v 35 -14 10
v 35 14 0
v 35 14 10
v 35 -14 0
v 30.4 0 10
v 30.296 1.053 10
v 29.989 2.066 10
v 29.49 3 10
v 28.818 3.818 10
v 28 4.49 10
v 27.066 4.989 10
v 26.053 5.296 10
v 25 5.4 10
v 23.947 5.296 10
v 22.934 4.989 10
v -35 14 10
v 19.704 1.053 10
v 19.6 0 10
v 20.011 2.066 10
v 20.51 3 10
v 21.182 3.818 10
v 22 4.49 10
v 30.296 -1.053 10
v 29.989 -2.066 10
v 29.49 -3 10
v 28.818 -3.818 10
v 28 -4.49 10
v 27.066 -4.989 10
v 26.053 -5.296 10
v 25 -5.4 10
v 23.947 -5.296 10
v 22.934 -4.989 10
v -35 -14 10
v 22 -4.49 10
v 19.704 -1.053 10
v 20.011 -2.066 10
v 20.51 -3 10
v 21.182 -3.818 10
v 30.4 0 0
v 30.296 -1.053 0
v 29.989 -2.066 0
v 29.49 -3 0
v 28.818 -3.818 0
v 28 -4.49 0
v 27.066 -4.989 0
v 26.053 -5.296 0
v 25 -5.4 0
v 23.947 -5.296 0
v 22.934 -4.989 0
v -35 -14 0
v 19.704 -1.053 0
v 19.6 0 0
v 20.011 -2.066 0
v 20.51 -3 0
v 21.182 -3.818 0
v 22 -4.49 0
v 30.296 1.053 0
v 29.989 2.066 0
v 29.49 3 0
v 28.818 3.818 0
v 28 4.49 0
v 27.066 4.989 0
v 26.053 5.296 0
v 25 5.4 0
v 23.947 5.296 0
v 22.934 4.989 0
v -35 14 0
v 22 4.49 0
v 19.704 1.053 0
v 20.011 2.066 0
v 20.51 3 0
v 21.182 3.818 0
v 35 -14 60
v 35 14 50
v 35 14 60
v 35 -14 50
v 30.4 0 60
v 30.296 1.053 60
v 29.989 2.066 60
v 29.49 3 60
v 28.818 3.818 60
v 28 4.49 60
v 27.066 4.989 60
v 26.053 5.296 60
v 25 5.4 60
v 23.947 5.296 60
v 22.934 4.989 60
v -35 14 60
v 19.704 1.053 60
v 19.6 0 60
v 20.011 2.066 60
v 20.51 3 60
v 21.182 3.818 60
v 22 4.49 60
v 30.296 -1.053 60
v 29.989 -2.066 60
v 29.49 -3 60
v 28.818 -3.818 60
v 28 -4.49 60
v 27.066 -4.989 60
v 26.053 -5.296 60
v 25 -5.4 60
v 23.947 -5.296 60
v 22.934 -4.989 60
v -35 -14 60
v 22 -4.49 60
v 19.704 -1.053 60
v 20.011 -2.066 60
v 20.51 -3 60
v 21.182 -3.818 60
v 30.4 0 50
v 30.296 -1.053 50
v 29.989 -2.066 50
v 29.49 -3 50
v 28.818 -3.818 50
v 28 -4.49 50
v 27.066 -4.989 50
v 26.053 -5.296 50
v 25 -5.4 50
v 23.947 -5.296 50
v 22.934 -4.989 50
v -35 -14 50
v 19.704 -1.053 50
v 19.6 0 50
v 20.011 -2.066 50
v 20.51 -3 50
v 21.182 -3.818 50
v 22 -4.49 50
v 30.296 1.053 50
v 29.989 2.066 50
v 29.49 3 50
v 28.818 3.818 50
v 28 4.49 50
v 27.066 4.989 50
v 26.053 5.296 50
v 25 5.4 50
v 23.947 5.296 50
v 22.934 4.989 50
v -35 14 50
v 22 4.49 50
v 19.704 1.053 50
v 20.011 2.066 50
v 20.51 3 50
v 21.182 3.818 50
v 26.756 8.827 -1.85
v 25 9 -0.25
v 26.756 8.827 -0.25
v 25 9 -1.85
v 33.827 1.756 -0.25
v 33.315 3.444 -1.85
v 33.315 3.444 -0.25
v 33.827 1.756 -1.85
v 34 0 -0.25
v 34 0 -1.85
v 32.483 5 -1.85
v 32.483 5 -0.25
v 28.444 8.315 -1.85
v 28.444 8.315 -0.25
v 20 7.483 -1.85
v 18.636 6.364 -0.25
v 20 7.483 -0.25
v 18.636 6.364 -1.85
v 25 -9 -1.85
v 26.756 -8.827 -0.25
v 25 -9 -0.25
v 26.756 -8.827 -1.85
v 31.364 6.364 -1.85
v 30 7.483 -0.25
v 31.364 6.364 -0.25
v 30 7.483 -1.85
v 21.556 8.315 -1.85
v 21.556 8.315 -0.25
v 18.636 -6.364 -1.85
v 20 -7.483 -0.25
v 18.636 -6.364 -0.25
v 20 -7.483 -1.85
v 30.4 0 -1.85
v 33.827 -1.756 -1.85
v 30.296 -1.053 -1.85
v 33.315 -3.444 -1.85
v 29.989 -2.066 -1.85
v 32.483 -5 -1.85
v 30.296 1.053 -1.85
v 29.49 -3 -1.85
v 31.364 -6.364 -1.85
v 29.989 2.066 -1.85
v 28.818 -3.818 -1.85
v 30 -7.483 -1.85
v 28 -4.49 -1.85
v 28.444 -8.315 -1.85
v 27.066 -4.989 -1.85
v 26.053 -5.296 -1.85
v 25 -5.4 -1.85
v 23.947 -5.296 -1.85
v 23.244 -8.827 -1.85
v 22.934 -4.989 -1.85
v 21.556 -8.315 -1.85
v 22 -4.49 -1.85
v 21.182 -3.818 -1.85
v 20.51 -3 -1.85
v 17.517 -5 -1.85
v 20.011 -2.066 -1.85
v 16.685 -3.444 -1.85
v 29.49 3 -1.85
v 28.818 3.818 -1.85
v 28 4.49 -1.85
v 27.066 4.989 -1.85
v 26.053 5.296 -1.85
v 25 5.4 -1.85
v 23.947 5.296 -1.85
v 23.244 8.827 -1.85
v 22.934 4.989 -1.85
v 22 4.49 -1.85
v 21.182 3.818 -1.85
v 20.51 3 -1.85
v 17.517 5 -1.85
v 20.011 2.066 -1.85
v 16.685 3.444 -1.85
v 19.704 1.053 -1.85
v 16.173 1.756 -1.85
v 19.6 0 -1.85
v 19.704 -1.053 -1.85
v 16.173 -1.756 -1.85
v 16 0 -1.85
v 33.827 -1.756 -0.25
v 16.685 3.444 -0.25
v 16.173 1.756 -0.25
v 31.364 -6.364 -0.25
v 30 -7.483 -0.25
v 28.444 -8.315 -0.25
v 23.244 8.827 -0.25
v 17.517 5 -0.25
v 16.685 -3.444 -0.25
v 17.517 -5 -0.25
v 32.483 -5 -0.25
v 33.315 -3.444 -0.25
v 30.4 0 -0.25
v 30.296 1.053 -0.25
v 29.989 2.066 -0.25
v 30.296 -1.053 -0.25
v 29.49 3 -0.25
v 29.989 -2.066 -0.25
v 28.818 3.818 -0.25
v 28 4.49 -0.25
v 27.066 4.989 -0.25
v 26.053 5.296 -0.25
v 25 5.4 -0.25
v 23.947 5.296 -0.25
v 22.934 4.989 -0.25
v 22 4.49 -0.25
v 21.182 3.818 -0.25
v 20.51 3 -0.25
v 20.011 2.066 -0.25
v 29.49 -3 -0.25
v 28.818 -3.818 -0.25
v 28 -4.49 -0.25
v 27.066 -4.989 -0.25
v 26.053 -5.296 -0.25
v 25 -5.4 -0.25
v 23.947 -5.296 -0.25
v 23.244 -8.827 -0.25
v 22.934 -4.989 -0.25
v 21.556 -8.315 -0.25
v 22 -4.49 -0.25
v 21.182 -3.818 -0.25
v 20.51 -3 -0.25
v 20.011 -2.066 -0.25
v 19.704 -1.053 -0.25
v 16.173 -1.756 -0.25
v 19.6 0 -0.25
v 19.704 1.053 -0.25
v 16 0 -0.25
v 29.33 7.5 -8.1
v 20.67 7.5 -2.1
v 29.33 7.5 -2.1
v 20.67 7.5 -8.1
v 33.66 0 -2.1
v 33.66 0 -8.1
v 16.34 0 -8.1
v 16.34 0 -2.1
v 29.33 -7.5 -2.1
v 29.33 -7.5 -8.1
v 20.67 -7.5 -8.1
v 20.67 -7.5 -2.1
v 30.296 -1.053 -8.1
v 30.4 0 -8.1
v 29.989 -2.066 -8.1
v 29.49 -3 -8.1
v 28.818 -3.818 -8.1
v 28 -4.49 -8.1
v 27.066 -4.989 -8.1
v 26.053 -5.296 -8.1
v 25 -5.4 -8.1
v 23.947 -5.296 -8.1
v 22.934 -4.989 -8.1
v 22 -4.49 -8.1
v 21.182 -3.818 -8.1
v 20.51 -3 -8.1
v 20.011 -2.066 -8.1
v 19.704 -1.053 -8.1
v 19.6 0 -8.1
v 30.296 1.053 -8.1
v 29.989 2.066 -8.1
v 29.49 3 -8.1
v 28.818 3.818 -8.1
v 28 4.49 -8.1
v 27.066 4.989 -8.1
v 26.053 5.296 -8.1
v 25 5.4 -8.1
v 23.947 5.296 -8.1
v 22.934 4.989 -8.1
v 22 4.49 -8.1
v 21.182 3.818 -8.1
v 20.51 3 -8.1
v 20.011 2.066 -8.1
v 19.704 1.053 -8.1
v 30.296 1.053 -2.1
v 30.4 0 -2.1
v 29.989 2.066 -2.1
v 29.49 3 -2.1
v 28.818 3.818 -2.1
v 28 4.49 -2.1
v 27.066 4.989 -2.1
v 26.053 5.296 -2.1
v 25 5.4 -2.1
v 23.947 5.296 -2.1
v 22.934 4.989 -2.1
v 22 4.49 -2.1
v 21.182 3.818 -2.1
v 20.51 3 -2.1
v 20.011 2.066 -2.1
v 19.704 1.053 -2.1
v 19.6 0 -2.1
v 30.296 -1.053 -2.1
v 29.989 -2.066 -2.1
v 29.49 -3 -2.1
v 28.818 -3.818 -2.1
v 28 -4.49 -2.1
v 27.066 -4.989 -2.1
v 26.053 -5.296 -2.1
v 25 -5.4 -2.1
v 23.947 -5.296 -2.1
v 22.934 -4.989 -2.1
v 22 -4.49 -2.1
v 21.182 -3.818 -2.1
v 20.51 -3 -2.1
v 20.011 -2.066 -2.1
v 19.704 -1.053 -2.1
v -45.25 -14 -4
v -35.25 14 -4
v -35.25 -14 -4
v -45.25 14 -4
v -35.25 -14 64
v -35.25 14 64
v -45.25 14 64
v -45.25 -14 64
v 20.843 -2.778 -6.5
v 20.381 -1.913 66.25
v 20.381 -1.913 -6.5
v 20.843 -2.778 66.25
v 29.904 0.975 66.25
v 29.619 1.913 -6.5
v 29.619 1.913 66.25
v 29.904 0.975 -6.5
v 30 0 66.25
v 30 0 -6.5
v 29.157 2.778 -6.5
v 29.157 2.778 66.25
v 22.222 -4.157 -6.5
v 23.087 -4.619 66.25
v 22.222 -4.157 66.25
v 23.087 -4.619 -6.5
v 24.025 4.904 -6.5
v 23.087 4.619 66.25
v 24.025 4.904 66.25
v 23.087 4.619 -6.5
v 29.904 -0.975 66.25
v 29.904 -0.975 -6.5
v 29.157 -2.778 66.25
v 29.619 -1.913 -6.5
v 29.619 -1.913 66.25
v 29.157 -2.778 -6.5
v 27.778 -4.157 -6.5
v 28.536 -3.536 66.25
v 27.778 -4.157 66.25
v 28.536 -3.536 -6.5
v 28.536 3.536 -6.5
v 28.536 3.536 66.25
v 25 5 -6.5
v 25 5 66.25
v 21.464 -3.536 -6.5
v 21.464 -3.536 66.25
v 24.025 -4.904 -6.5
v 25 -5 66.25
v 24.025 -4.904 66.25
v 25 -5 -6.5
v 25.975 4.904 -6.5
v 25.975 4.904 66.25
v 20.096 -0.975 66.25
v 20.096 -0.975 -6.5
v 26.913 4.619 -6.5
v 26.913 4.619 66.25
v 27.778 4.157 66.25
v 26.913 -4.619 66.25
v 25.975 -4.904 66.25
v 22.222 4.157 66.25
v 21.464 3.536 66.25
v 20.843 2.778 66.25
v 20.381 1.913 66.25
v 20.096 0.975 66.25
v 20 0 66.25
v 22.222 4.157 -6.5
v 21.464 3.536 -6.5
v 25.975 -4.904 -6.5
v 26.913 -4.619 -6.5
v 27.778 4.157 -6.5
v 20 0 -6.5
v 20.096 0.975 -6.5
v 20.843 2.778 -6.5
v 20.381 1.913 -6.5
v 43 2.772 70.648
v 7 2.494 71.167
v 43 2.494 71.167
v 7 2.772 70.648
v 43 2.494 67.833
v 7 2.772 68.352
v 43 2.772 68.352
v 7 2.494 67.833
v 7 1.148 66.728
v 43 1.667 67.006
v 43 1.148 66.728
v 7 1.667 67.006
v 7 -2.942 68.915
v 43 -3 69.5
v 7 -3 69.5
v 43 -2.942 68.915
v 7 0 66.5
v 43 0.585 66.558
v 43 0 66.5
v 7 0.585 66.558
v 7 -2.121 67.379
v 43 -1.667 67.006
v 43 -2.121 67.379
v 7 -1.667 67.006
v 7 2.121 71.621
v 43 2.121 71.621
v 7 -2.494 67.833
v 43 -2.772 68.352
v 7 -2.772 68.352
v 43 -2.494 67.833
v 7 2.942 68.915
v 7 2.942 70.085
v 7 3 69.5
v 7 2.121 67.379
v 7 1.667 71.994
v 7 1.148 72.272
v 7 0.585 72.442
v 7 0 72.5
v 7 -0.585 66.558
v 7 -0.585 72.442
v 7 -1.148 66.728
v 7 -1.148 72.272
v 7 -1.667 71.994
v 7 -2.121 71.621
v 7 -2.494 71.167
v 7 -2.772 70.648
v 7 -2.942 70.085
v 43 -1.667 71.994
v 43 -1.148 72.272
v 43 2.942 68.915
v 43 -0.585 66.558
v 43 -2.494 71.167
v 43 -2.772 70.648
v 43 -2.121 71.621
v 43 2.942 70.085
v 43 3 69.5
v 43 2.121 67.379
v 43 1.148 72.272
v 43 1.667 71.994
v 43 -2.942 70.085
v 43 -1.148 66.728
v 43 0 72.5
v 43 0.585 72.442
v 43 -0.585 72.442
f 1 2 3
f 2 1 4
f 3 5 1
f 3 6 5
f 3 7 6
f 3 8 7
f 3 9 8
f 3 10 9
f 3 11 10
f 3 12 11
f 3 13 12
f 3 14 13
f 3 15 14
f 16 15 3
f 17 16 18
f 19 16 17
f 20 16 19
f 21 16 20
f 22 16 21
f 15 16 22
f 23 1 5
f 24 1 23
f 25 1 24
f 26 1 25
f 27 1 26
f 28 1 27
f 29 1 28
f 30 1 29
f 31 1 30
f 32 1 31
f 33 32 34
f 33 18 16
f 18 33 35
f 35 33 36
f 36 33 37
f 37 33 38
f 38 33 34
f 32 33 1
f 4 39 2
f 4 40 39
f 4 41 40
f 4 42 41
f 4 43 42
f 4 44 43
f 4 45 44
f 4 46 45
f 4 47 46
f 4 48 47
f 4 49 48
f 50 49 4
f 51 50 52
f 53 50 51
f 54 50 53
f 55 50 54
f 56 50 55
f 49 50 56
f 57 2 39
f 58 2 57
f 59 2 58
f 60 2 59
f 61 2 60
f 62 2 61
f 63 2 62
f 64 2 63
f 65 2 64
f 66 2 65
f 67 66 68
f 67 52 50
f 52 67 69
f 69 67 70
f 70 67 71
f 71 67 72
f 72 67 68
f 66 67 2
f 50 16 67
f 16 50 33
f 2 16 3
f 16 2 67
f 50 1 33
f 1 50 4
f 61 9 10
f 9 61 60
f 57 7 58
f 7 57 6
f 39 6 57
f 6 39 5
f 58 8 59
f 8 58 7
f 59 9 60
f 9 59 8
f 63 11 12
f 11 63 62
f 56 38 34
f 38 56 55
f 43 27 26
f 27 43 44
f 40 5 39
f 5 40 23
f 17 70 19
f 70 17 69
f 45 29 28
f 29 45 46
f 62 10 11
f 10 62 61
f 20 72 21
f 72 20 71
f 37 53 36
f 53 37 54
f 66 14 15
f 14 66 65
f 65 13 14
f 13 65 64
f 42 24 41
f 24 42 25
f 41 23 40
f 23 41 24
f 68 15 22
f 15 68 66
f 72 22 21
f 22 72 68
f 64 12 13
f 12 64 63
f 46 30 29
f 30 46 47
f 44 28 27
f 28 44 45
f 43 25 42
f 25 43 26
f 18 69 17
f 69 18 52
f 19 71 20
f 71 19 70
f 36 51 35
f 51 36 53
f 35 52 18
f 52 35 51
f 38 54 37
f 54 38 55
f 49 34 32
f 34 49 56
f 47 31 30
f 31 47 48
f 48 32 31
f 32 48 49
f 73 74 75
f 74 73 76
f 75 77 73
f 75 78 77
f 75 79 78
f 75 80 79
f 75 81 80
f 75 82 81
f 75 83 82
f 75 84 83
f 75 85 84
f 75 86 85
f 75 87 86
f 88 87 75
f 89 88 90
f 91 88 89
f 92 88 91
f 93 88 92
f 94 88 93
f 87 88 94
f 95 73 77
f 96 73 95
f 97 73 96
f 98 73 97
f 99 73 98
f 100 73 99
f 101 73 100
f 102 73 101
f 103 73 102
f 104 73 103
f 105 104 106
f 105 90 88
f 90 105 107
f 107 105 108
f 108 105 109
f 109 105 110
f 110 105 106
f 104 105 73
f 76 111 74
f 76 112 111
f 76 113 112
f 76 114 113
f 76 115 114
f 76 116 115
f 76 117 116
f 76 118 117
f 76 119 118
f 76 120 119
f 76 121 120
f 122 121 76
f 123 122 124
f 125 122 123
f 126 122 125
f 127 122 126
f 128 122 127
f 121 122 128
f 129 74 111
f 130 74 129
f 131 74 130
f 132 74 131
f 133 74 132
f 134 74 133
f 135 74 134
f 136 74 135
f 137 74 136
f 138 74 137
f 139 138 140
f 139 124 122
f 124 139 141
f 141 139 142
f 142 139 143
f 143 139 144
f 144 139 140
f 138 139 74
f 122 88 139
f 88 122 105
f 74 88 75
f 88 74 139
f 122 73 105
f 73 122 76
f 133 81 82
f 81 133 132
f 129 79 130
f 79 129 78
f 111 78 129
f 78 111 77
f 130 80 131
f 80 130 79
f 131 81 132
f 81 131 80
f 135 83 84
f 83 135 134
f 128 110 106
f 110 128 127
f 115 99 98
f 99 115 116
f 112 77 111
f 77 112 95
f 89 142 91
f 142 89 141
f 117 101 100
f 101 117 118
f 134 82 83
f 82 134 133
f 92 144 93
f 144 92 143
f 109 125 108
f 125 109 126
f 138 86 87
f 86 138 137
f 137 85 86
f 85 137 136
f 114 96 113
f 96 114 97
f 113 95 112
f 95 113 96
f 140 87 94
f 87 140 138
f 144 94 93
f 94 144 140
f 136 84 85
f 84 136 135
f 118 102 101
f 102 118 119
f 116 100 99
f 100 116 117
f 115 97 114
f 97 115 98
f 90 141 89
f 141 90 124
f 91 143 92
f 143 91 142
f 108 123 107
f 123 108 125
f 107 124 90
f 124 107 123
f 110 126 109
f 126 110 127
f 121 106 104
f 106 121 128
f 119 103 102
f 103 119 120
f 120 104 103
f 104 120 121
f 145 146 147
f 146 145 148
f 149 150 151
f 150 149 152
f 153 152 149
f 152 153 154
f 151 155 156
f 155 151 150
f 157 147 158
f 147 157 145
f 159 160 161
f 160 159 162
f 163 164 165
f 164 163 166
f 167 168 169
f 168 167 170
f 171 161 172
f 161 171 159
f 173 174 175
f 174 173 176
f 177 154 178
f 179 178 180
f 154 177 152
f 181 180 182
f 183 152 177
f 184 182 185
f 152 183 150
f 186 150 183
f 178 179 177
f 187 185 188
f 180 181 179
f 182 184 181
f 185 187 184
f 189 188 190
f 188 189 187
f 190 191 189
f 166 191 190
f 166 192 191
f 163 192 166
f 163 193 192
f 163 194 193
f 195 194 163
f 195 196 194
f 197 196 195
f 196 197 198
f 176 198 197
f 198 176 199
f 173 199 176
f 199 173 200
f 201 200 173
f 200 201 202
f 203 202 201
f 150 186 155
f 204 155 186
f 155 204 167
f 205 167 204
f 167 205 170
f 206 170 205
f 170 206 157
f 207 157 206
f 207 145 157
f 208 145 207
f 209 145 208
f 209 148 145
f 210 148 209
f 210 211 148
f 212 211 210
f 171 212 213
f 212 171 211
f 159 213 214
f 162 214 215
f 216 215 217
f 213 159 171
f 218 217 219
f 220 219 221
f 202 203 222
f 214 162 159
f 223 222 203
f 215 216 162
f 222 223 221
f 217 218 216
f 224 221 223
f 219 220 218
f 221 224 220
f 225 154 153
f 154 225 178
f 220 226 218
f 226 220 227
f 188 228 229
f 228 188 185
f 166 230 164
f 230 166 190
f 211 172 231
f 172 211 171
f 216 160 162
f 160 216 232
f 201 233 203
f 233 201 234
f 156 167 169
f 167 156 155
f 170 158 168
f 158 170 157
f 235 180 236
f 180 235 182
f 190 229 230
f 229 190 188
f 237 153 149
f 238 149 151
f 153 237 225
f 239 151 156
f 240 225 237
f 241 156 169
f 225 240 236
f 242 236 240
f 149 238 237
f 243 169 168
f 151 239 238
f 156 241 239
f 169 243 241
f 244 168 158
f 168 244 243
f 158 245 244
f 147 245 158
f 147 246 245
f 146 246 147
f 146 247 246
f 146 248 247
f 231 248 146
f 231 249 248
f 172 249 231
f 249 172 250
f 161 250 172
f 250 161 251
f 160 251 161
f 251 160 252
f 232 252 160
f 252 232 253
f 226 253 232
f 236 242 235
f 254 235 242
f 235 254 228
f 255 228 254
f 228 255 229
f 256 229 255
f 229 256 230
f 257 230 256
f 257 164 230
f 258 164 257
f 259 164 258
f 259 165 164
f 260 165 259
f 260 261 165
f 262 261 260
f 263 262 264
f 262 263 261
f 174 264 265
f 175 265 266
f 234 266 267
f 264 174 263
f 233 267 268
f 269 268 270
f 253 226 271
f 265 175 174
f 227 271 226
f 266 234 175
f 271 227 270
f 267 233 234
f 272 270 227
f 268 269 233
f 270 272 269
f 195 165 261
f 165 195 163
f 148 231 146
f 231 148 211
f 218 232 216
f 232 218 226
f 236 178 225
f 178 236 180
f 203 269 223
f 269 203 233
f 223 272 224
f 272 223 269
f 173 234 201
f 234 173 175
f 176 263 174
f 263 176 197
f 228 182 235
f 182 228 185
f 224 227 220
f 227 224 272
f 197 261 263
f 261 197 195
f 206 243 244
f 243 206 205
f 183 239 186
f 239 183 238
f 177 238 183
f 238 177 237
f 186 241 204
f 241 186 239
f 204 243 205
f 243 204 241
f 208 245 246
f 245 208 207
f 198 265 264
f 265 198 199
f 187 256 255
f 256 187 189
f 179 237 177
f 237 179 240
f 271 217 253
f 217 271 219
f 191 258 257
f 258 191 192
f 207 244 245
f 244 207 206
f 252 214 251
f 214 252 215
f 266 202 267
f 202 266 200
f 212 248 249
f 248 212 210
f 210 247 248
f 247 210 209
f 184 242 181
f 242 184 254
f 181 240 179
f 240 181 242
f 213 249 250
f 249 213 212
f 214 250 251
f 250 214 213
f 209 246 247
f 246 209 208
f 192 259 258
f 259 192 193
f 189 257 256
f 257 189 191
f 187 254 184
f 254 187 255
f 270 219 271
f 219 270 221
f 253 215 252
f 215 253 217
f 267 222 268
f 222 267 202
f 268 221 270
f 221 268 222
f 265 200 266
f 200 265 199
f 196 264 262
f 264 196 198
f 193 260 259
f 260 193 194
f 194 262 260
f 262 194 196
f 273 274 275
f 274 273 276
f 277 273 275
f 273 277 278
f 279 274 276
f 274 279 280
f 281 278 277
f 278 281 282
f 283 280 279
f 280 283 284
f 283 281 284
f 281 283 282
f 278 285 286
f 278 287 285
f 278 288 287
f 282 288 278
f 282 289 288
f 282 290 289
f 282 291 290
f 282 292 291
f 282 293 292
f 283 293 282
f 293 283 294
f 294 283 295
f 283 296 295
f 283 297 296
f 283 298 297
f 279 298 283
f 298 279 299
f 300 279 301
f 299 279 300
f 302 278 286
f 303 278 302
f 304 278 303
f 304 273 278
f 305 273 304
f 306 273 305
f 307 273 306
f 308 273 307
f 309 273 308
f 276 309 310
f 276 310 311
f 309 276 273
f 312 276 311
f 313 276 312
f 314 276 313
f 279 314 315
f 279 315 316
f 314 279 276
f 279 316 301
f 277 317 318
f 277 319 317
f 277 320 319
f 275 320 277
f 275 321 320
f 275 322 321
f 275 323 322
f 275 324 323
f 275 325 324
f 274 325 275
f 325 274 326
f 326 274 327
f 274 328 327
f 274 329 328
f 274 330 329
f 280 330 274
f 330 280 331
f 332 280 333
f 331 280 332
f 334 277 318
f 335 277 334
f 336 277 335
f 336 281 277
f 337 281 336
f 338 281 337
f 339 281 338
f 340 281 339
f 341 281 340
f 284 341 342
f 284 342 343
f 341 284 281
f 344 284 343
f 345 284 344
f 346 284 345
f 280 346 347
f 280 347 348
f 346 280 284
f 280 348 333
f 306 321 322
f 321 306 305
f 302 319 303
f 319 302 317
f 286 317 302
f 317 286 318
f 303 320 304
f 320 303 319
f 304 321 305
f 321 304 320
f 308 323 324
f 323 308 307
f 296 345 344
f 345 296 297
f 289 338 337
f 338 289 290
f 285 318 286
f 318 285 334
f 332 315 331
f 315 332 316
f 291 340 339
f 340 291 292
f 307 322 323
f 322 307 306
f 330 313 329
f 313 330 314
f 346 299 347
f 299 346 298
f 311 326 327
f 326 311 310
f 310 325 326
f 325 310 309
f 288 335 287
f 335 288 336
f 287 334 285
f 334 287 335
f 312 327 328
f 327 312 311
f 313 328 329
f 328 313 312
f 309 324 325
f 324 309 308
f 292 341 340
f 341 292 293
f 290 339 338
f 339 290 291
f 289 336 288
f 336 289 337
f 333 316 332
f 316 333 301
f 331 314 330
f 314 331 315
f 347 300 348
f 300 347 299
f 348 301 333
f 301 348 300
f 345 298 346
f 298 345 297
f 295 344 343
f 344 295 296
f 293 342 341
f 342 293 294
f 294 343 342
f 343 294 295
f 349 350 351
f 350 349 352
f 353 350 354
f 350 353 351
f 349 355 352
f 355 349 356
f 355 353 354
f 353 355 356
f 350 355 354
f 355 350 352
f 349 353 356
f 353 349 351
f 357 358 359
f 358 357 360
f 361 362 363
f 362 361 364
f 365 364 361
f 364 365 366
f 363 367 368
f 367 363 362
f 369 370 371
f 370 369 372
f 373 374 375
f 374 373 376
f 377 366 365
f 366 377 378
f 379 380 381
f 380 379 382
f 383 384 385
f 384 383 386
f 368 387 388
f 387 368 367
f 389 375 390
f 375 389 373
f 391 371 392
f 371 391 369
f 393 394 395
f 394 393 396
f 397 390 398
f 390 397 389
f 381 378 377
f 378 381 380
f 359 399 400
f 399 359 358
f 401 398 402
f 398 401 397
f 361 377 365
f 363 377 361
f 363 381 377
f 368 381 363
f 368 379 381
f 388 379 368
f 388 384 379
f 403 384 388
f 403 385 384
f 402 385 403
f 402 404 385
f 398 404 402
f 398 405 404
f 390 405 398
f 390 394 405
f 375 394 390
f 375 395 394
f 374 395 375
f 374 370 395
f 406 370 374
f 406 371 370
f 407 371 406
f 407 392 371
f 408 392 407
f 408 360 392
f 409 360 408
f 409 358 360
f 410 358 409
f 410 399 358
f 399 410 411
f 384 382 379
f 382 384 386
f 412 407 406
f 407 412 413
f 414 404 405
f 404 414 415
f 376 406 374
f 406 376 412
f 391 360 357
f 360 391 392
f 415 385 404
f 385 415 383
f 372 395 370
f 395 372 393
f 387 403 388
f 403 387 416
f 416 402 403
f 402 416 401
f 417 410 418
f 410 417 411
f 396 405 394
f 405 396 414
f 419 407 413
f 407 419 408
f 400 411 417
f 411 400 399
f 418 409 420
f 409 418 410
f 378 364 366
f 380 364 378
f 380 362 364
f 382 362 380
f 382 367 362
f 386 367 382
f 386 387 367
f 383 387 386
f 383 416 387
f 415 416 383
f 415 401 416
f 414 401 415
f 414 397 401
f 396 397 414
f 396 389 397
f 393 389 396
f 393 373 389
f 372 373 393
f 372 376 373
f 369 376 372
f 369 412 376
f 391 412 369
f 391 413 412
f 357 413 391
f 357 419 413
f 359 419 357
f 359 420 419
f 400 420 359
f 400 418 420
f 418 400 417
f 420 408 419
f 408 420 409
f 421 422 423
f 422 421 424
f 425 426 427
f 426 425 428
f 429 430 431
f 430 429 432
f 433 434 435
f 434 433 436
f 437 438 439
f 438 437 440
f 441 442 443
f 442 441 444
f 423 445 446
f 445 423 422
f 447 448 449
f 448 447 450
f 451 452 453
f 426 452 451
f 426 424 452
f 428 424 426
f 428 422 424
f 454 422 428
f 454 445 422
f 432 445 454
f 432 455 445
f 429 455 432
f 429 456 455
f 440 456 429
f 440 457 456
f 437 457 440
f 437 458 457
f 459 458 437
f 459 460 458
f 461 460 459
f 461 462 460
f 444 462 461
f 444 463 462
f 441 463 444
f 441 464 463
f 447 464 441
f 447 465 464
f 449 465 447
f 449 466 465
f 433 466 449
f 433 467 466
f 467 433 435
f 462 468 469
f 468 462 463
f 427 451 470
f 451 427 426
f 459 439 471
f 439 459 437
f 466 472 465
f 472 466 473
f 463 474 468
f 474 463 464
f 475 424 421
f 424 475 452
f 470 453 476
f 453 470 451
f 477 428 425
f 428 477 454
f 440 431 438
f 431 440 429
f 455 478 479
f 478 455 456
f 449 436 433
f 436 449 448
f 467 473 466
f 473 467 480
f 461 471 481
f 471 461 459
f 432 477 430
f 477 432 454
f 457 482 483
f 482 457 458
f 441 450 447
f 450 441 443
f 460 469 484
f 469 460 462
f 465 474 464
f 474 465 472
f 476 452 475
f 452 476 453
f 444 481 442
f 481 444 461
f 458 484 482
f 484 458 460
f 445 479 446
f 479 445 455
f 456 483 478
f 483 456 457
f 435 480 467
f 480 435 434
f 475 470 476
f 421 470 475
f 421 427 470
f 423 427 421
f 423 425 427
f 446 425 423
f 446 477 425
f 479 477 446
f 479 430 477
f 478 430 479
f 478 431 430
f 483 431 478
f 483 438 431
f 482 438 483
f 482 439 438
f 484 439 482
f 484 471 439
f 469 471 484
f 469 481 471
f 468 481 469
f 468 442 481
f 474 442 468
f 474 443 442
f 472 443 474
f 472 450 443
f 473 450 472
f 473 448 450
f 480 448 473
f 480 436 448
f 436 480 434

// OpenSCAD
$fn = 32;

// ------------------------------------------------------------------------
// C clamp: throat 50 mm, screw d10
// Every part is its own module, assembly() places every instance.
// ------------------------------------------------------------------------

// --- part 1 ---
module clamp_arm() {
  difference() {
    translate([-35, -14, 0]) cube([70, 28, 10]);
    translate([25, 0, -1]) cylinder(h = 12, d = 10.8);
  }
}

// --- part 2 ---
module clamp_spine() {
  difference() {
    translate([-34, -14, 0]) cube([68, 28, 10]);
  }
}

// --- part 3 ---
module clamp_screw() {
  translate([0, 0, -36.375]) cylinder(h = 72.75, d = 10);
}

// --- part 4 ---
module clamp_washer() {
  difference() {
      translate([0, 0, 0]) cylinder(h = 1.6, d = 18);
      translate([0, 0, -1]) cylinder(h = 3.6, d = 10.8);
    }
}

// --- part 5 ---
module clamp_nut() {
  difference() {
    linear_extrude(height = 6) polygon(points = [[8.66, 0], [4.33, 7.5], [-4.33, 7.5], [-8.66, 0], [-4.33, -7.5], [4.33, -7.5]]);
    translate([0, 0, -1]) cylinder(h = 8, d = 10.8);
  }
}

// --- part 6 ---
module tommy_bar() {
  translate([0, 0, -18]) cylinder(h = 36, d = 6);
}

// --- assembly ---
module assembly() {
  color([0.80, 0.24, 0.20]) translate([0, 0, 0]) rotate([0, 0, 0]) clamp_arm();
  color([0.20, 0.45, 0.75]) translate([0, 0, 50]) rotate([0, 0, 0]) clamp_arm();
  color([0.25, 0.62, 0.32]) translate([-45.25, 0, 30]) rotate([0, 90, 0]) clamp_spine();
  color([0.92, 0.70, 0.18]) translate([25, 0, 29.875]) rotate([0, 0, 0]) clamp_screw();
  color([0.58, 0.35, 0.70]) translate([25, 0, -1.85]) rotate([0, 0, 0]) clamp_washer();
  color([0.16, 0.66, 0.66]) translate([25, 0, -8.1]) rotate([0, 0, 0]) clamp_nut();
  color([0.85, 0.48, 0.18]) translate([25, 0, 69.5]) rotate([0, 90, 0]) tommy_bar();
}

assembly();
